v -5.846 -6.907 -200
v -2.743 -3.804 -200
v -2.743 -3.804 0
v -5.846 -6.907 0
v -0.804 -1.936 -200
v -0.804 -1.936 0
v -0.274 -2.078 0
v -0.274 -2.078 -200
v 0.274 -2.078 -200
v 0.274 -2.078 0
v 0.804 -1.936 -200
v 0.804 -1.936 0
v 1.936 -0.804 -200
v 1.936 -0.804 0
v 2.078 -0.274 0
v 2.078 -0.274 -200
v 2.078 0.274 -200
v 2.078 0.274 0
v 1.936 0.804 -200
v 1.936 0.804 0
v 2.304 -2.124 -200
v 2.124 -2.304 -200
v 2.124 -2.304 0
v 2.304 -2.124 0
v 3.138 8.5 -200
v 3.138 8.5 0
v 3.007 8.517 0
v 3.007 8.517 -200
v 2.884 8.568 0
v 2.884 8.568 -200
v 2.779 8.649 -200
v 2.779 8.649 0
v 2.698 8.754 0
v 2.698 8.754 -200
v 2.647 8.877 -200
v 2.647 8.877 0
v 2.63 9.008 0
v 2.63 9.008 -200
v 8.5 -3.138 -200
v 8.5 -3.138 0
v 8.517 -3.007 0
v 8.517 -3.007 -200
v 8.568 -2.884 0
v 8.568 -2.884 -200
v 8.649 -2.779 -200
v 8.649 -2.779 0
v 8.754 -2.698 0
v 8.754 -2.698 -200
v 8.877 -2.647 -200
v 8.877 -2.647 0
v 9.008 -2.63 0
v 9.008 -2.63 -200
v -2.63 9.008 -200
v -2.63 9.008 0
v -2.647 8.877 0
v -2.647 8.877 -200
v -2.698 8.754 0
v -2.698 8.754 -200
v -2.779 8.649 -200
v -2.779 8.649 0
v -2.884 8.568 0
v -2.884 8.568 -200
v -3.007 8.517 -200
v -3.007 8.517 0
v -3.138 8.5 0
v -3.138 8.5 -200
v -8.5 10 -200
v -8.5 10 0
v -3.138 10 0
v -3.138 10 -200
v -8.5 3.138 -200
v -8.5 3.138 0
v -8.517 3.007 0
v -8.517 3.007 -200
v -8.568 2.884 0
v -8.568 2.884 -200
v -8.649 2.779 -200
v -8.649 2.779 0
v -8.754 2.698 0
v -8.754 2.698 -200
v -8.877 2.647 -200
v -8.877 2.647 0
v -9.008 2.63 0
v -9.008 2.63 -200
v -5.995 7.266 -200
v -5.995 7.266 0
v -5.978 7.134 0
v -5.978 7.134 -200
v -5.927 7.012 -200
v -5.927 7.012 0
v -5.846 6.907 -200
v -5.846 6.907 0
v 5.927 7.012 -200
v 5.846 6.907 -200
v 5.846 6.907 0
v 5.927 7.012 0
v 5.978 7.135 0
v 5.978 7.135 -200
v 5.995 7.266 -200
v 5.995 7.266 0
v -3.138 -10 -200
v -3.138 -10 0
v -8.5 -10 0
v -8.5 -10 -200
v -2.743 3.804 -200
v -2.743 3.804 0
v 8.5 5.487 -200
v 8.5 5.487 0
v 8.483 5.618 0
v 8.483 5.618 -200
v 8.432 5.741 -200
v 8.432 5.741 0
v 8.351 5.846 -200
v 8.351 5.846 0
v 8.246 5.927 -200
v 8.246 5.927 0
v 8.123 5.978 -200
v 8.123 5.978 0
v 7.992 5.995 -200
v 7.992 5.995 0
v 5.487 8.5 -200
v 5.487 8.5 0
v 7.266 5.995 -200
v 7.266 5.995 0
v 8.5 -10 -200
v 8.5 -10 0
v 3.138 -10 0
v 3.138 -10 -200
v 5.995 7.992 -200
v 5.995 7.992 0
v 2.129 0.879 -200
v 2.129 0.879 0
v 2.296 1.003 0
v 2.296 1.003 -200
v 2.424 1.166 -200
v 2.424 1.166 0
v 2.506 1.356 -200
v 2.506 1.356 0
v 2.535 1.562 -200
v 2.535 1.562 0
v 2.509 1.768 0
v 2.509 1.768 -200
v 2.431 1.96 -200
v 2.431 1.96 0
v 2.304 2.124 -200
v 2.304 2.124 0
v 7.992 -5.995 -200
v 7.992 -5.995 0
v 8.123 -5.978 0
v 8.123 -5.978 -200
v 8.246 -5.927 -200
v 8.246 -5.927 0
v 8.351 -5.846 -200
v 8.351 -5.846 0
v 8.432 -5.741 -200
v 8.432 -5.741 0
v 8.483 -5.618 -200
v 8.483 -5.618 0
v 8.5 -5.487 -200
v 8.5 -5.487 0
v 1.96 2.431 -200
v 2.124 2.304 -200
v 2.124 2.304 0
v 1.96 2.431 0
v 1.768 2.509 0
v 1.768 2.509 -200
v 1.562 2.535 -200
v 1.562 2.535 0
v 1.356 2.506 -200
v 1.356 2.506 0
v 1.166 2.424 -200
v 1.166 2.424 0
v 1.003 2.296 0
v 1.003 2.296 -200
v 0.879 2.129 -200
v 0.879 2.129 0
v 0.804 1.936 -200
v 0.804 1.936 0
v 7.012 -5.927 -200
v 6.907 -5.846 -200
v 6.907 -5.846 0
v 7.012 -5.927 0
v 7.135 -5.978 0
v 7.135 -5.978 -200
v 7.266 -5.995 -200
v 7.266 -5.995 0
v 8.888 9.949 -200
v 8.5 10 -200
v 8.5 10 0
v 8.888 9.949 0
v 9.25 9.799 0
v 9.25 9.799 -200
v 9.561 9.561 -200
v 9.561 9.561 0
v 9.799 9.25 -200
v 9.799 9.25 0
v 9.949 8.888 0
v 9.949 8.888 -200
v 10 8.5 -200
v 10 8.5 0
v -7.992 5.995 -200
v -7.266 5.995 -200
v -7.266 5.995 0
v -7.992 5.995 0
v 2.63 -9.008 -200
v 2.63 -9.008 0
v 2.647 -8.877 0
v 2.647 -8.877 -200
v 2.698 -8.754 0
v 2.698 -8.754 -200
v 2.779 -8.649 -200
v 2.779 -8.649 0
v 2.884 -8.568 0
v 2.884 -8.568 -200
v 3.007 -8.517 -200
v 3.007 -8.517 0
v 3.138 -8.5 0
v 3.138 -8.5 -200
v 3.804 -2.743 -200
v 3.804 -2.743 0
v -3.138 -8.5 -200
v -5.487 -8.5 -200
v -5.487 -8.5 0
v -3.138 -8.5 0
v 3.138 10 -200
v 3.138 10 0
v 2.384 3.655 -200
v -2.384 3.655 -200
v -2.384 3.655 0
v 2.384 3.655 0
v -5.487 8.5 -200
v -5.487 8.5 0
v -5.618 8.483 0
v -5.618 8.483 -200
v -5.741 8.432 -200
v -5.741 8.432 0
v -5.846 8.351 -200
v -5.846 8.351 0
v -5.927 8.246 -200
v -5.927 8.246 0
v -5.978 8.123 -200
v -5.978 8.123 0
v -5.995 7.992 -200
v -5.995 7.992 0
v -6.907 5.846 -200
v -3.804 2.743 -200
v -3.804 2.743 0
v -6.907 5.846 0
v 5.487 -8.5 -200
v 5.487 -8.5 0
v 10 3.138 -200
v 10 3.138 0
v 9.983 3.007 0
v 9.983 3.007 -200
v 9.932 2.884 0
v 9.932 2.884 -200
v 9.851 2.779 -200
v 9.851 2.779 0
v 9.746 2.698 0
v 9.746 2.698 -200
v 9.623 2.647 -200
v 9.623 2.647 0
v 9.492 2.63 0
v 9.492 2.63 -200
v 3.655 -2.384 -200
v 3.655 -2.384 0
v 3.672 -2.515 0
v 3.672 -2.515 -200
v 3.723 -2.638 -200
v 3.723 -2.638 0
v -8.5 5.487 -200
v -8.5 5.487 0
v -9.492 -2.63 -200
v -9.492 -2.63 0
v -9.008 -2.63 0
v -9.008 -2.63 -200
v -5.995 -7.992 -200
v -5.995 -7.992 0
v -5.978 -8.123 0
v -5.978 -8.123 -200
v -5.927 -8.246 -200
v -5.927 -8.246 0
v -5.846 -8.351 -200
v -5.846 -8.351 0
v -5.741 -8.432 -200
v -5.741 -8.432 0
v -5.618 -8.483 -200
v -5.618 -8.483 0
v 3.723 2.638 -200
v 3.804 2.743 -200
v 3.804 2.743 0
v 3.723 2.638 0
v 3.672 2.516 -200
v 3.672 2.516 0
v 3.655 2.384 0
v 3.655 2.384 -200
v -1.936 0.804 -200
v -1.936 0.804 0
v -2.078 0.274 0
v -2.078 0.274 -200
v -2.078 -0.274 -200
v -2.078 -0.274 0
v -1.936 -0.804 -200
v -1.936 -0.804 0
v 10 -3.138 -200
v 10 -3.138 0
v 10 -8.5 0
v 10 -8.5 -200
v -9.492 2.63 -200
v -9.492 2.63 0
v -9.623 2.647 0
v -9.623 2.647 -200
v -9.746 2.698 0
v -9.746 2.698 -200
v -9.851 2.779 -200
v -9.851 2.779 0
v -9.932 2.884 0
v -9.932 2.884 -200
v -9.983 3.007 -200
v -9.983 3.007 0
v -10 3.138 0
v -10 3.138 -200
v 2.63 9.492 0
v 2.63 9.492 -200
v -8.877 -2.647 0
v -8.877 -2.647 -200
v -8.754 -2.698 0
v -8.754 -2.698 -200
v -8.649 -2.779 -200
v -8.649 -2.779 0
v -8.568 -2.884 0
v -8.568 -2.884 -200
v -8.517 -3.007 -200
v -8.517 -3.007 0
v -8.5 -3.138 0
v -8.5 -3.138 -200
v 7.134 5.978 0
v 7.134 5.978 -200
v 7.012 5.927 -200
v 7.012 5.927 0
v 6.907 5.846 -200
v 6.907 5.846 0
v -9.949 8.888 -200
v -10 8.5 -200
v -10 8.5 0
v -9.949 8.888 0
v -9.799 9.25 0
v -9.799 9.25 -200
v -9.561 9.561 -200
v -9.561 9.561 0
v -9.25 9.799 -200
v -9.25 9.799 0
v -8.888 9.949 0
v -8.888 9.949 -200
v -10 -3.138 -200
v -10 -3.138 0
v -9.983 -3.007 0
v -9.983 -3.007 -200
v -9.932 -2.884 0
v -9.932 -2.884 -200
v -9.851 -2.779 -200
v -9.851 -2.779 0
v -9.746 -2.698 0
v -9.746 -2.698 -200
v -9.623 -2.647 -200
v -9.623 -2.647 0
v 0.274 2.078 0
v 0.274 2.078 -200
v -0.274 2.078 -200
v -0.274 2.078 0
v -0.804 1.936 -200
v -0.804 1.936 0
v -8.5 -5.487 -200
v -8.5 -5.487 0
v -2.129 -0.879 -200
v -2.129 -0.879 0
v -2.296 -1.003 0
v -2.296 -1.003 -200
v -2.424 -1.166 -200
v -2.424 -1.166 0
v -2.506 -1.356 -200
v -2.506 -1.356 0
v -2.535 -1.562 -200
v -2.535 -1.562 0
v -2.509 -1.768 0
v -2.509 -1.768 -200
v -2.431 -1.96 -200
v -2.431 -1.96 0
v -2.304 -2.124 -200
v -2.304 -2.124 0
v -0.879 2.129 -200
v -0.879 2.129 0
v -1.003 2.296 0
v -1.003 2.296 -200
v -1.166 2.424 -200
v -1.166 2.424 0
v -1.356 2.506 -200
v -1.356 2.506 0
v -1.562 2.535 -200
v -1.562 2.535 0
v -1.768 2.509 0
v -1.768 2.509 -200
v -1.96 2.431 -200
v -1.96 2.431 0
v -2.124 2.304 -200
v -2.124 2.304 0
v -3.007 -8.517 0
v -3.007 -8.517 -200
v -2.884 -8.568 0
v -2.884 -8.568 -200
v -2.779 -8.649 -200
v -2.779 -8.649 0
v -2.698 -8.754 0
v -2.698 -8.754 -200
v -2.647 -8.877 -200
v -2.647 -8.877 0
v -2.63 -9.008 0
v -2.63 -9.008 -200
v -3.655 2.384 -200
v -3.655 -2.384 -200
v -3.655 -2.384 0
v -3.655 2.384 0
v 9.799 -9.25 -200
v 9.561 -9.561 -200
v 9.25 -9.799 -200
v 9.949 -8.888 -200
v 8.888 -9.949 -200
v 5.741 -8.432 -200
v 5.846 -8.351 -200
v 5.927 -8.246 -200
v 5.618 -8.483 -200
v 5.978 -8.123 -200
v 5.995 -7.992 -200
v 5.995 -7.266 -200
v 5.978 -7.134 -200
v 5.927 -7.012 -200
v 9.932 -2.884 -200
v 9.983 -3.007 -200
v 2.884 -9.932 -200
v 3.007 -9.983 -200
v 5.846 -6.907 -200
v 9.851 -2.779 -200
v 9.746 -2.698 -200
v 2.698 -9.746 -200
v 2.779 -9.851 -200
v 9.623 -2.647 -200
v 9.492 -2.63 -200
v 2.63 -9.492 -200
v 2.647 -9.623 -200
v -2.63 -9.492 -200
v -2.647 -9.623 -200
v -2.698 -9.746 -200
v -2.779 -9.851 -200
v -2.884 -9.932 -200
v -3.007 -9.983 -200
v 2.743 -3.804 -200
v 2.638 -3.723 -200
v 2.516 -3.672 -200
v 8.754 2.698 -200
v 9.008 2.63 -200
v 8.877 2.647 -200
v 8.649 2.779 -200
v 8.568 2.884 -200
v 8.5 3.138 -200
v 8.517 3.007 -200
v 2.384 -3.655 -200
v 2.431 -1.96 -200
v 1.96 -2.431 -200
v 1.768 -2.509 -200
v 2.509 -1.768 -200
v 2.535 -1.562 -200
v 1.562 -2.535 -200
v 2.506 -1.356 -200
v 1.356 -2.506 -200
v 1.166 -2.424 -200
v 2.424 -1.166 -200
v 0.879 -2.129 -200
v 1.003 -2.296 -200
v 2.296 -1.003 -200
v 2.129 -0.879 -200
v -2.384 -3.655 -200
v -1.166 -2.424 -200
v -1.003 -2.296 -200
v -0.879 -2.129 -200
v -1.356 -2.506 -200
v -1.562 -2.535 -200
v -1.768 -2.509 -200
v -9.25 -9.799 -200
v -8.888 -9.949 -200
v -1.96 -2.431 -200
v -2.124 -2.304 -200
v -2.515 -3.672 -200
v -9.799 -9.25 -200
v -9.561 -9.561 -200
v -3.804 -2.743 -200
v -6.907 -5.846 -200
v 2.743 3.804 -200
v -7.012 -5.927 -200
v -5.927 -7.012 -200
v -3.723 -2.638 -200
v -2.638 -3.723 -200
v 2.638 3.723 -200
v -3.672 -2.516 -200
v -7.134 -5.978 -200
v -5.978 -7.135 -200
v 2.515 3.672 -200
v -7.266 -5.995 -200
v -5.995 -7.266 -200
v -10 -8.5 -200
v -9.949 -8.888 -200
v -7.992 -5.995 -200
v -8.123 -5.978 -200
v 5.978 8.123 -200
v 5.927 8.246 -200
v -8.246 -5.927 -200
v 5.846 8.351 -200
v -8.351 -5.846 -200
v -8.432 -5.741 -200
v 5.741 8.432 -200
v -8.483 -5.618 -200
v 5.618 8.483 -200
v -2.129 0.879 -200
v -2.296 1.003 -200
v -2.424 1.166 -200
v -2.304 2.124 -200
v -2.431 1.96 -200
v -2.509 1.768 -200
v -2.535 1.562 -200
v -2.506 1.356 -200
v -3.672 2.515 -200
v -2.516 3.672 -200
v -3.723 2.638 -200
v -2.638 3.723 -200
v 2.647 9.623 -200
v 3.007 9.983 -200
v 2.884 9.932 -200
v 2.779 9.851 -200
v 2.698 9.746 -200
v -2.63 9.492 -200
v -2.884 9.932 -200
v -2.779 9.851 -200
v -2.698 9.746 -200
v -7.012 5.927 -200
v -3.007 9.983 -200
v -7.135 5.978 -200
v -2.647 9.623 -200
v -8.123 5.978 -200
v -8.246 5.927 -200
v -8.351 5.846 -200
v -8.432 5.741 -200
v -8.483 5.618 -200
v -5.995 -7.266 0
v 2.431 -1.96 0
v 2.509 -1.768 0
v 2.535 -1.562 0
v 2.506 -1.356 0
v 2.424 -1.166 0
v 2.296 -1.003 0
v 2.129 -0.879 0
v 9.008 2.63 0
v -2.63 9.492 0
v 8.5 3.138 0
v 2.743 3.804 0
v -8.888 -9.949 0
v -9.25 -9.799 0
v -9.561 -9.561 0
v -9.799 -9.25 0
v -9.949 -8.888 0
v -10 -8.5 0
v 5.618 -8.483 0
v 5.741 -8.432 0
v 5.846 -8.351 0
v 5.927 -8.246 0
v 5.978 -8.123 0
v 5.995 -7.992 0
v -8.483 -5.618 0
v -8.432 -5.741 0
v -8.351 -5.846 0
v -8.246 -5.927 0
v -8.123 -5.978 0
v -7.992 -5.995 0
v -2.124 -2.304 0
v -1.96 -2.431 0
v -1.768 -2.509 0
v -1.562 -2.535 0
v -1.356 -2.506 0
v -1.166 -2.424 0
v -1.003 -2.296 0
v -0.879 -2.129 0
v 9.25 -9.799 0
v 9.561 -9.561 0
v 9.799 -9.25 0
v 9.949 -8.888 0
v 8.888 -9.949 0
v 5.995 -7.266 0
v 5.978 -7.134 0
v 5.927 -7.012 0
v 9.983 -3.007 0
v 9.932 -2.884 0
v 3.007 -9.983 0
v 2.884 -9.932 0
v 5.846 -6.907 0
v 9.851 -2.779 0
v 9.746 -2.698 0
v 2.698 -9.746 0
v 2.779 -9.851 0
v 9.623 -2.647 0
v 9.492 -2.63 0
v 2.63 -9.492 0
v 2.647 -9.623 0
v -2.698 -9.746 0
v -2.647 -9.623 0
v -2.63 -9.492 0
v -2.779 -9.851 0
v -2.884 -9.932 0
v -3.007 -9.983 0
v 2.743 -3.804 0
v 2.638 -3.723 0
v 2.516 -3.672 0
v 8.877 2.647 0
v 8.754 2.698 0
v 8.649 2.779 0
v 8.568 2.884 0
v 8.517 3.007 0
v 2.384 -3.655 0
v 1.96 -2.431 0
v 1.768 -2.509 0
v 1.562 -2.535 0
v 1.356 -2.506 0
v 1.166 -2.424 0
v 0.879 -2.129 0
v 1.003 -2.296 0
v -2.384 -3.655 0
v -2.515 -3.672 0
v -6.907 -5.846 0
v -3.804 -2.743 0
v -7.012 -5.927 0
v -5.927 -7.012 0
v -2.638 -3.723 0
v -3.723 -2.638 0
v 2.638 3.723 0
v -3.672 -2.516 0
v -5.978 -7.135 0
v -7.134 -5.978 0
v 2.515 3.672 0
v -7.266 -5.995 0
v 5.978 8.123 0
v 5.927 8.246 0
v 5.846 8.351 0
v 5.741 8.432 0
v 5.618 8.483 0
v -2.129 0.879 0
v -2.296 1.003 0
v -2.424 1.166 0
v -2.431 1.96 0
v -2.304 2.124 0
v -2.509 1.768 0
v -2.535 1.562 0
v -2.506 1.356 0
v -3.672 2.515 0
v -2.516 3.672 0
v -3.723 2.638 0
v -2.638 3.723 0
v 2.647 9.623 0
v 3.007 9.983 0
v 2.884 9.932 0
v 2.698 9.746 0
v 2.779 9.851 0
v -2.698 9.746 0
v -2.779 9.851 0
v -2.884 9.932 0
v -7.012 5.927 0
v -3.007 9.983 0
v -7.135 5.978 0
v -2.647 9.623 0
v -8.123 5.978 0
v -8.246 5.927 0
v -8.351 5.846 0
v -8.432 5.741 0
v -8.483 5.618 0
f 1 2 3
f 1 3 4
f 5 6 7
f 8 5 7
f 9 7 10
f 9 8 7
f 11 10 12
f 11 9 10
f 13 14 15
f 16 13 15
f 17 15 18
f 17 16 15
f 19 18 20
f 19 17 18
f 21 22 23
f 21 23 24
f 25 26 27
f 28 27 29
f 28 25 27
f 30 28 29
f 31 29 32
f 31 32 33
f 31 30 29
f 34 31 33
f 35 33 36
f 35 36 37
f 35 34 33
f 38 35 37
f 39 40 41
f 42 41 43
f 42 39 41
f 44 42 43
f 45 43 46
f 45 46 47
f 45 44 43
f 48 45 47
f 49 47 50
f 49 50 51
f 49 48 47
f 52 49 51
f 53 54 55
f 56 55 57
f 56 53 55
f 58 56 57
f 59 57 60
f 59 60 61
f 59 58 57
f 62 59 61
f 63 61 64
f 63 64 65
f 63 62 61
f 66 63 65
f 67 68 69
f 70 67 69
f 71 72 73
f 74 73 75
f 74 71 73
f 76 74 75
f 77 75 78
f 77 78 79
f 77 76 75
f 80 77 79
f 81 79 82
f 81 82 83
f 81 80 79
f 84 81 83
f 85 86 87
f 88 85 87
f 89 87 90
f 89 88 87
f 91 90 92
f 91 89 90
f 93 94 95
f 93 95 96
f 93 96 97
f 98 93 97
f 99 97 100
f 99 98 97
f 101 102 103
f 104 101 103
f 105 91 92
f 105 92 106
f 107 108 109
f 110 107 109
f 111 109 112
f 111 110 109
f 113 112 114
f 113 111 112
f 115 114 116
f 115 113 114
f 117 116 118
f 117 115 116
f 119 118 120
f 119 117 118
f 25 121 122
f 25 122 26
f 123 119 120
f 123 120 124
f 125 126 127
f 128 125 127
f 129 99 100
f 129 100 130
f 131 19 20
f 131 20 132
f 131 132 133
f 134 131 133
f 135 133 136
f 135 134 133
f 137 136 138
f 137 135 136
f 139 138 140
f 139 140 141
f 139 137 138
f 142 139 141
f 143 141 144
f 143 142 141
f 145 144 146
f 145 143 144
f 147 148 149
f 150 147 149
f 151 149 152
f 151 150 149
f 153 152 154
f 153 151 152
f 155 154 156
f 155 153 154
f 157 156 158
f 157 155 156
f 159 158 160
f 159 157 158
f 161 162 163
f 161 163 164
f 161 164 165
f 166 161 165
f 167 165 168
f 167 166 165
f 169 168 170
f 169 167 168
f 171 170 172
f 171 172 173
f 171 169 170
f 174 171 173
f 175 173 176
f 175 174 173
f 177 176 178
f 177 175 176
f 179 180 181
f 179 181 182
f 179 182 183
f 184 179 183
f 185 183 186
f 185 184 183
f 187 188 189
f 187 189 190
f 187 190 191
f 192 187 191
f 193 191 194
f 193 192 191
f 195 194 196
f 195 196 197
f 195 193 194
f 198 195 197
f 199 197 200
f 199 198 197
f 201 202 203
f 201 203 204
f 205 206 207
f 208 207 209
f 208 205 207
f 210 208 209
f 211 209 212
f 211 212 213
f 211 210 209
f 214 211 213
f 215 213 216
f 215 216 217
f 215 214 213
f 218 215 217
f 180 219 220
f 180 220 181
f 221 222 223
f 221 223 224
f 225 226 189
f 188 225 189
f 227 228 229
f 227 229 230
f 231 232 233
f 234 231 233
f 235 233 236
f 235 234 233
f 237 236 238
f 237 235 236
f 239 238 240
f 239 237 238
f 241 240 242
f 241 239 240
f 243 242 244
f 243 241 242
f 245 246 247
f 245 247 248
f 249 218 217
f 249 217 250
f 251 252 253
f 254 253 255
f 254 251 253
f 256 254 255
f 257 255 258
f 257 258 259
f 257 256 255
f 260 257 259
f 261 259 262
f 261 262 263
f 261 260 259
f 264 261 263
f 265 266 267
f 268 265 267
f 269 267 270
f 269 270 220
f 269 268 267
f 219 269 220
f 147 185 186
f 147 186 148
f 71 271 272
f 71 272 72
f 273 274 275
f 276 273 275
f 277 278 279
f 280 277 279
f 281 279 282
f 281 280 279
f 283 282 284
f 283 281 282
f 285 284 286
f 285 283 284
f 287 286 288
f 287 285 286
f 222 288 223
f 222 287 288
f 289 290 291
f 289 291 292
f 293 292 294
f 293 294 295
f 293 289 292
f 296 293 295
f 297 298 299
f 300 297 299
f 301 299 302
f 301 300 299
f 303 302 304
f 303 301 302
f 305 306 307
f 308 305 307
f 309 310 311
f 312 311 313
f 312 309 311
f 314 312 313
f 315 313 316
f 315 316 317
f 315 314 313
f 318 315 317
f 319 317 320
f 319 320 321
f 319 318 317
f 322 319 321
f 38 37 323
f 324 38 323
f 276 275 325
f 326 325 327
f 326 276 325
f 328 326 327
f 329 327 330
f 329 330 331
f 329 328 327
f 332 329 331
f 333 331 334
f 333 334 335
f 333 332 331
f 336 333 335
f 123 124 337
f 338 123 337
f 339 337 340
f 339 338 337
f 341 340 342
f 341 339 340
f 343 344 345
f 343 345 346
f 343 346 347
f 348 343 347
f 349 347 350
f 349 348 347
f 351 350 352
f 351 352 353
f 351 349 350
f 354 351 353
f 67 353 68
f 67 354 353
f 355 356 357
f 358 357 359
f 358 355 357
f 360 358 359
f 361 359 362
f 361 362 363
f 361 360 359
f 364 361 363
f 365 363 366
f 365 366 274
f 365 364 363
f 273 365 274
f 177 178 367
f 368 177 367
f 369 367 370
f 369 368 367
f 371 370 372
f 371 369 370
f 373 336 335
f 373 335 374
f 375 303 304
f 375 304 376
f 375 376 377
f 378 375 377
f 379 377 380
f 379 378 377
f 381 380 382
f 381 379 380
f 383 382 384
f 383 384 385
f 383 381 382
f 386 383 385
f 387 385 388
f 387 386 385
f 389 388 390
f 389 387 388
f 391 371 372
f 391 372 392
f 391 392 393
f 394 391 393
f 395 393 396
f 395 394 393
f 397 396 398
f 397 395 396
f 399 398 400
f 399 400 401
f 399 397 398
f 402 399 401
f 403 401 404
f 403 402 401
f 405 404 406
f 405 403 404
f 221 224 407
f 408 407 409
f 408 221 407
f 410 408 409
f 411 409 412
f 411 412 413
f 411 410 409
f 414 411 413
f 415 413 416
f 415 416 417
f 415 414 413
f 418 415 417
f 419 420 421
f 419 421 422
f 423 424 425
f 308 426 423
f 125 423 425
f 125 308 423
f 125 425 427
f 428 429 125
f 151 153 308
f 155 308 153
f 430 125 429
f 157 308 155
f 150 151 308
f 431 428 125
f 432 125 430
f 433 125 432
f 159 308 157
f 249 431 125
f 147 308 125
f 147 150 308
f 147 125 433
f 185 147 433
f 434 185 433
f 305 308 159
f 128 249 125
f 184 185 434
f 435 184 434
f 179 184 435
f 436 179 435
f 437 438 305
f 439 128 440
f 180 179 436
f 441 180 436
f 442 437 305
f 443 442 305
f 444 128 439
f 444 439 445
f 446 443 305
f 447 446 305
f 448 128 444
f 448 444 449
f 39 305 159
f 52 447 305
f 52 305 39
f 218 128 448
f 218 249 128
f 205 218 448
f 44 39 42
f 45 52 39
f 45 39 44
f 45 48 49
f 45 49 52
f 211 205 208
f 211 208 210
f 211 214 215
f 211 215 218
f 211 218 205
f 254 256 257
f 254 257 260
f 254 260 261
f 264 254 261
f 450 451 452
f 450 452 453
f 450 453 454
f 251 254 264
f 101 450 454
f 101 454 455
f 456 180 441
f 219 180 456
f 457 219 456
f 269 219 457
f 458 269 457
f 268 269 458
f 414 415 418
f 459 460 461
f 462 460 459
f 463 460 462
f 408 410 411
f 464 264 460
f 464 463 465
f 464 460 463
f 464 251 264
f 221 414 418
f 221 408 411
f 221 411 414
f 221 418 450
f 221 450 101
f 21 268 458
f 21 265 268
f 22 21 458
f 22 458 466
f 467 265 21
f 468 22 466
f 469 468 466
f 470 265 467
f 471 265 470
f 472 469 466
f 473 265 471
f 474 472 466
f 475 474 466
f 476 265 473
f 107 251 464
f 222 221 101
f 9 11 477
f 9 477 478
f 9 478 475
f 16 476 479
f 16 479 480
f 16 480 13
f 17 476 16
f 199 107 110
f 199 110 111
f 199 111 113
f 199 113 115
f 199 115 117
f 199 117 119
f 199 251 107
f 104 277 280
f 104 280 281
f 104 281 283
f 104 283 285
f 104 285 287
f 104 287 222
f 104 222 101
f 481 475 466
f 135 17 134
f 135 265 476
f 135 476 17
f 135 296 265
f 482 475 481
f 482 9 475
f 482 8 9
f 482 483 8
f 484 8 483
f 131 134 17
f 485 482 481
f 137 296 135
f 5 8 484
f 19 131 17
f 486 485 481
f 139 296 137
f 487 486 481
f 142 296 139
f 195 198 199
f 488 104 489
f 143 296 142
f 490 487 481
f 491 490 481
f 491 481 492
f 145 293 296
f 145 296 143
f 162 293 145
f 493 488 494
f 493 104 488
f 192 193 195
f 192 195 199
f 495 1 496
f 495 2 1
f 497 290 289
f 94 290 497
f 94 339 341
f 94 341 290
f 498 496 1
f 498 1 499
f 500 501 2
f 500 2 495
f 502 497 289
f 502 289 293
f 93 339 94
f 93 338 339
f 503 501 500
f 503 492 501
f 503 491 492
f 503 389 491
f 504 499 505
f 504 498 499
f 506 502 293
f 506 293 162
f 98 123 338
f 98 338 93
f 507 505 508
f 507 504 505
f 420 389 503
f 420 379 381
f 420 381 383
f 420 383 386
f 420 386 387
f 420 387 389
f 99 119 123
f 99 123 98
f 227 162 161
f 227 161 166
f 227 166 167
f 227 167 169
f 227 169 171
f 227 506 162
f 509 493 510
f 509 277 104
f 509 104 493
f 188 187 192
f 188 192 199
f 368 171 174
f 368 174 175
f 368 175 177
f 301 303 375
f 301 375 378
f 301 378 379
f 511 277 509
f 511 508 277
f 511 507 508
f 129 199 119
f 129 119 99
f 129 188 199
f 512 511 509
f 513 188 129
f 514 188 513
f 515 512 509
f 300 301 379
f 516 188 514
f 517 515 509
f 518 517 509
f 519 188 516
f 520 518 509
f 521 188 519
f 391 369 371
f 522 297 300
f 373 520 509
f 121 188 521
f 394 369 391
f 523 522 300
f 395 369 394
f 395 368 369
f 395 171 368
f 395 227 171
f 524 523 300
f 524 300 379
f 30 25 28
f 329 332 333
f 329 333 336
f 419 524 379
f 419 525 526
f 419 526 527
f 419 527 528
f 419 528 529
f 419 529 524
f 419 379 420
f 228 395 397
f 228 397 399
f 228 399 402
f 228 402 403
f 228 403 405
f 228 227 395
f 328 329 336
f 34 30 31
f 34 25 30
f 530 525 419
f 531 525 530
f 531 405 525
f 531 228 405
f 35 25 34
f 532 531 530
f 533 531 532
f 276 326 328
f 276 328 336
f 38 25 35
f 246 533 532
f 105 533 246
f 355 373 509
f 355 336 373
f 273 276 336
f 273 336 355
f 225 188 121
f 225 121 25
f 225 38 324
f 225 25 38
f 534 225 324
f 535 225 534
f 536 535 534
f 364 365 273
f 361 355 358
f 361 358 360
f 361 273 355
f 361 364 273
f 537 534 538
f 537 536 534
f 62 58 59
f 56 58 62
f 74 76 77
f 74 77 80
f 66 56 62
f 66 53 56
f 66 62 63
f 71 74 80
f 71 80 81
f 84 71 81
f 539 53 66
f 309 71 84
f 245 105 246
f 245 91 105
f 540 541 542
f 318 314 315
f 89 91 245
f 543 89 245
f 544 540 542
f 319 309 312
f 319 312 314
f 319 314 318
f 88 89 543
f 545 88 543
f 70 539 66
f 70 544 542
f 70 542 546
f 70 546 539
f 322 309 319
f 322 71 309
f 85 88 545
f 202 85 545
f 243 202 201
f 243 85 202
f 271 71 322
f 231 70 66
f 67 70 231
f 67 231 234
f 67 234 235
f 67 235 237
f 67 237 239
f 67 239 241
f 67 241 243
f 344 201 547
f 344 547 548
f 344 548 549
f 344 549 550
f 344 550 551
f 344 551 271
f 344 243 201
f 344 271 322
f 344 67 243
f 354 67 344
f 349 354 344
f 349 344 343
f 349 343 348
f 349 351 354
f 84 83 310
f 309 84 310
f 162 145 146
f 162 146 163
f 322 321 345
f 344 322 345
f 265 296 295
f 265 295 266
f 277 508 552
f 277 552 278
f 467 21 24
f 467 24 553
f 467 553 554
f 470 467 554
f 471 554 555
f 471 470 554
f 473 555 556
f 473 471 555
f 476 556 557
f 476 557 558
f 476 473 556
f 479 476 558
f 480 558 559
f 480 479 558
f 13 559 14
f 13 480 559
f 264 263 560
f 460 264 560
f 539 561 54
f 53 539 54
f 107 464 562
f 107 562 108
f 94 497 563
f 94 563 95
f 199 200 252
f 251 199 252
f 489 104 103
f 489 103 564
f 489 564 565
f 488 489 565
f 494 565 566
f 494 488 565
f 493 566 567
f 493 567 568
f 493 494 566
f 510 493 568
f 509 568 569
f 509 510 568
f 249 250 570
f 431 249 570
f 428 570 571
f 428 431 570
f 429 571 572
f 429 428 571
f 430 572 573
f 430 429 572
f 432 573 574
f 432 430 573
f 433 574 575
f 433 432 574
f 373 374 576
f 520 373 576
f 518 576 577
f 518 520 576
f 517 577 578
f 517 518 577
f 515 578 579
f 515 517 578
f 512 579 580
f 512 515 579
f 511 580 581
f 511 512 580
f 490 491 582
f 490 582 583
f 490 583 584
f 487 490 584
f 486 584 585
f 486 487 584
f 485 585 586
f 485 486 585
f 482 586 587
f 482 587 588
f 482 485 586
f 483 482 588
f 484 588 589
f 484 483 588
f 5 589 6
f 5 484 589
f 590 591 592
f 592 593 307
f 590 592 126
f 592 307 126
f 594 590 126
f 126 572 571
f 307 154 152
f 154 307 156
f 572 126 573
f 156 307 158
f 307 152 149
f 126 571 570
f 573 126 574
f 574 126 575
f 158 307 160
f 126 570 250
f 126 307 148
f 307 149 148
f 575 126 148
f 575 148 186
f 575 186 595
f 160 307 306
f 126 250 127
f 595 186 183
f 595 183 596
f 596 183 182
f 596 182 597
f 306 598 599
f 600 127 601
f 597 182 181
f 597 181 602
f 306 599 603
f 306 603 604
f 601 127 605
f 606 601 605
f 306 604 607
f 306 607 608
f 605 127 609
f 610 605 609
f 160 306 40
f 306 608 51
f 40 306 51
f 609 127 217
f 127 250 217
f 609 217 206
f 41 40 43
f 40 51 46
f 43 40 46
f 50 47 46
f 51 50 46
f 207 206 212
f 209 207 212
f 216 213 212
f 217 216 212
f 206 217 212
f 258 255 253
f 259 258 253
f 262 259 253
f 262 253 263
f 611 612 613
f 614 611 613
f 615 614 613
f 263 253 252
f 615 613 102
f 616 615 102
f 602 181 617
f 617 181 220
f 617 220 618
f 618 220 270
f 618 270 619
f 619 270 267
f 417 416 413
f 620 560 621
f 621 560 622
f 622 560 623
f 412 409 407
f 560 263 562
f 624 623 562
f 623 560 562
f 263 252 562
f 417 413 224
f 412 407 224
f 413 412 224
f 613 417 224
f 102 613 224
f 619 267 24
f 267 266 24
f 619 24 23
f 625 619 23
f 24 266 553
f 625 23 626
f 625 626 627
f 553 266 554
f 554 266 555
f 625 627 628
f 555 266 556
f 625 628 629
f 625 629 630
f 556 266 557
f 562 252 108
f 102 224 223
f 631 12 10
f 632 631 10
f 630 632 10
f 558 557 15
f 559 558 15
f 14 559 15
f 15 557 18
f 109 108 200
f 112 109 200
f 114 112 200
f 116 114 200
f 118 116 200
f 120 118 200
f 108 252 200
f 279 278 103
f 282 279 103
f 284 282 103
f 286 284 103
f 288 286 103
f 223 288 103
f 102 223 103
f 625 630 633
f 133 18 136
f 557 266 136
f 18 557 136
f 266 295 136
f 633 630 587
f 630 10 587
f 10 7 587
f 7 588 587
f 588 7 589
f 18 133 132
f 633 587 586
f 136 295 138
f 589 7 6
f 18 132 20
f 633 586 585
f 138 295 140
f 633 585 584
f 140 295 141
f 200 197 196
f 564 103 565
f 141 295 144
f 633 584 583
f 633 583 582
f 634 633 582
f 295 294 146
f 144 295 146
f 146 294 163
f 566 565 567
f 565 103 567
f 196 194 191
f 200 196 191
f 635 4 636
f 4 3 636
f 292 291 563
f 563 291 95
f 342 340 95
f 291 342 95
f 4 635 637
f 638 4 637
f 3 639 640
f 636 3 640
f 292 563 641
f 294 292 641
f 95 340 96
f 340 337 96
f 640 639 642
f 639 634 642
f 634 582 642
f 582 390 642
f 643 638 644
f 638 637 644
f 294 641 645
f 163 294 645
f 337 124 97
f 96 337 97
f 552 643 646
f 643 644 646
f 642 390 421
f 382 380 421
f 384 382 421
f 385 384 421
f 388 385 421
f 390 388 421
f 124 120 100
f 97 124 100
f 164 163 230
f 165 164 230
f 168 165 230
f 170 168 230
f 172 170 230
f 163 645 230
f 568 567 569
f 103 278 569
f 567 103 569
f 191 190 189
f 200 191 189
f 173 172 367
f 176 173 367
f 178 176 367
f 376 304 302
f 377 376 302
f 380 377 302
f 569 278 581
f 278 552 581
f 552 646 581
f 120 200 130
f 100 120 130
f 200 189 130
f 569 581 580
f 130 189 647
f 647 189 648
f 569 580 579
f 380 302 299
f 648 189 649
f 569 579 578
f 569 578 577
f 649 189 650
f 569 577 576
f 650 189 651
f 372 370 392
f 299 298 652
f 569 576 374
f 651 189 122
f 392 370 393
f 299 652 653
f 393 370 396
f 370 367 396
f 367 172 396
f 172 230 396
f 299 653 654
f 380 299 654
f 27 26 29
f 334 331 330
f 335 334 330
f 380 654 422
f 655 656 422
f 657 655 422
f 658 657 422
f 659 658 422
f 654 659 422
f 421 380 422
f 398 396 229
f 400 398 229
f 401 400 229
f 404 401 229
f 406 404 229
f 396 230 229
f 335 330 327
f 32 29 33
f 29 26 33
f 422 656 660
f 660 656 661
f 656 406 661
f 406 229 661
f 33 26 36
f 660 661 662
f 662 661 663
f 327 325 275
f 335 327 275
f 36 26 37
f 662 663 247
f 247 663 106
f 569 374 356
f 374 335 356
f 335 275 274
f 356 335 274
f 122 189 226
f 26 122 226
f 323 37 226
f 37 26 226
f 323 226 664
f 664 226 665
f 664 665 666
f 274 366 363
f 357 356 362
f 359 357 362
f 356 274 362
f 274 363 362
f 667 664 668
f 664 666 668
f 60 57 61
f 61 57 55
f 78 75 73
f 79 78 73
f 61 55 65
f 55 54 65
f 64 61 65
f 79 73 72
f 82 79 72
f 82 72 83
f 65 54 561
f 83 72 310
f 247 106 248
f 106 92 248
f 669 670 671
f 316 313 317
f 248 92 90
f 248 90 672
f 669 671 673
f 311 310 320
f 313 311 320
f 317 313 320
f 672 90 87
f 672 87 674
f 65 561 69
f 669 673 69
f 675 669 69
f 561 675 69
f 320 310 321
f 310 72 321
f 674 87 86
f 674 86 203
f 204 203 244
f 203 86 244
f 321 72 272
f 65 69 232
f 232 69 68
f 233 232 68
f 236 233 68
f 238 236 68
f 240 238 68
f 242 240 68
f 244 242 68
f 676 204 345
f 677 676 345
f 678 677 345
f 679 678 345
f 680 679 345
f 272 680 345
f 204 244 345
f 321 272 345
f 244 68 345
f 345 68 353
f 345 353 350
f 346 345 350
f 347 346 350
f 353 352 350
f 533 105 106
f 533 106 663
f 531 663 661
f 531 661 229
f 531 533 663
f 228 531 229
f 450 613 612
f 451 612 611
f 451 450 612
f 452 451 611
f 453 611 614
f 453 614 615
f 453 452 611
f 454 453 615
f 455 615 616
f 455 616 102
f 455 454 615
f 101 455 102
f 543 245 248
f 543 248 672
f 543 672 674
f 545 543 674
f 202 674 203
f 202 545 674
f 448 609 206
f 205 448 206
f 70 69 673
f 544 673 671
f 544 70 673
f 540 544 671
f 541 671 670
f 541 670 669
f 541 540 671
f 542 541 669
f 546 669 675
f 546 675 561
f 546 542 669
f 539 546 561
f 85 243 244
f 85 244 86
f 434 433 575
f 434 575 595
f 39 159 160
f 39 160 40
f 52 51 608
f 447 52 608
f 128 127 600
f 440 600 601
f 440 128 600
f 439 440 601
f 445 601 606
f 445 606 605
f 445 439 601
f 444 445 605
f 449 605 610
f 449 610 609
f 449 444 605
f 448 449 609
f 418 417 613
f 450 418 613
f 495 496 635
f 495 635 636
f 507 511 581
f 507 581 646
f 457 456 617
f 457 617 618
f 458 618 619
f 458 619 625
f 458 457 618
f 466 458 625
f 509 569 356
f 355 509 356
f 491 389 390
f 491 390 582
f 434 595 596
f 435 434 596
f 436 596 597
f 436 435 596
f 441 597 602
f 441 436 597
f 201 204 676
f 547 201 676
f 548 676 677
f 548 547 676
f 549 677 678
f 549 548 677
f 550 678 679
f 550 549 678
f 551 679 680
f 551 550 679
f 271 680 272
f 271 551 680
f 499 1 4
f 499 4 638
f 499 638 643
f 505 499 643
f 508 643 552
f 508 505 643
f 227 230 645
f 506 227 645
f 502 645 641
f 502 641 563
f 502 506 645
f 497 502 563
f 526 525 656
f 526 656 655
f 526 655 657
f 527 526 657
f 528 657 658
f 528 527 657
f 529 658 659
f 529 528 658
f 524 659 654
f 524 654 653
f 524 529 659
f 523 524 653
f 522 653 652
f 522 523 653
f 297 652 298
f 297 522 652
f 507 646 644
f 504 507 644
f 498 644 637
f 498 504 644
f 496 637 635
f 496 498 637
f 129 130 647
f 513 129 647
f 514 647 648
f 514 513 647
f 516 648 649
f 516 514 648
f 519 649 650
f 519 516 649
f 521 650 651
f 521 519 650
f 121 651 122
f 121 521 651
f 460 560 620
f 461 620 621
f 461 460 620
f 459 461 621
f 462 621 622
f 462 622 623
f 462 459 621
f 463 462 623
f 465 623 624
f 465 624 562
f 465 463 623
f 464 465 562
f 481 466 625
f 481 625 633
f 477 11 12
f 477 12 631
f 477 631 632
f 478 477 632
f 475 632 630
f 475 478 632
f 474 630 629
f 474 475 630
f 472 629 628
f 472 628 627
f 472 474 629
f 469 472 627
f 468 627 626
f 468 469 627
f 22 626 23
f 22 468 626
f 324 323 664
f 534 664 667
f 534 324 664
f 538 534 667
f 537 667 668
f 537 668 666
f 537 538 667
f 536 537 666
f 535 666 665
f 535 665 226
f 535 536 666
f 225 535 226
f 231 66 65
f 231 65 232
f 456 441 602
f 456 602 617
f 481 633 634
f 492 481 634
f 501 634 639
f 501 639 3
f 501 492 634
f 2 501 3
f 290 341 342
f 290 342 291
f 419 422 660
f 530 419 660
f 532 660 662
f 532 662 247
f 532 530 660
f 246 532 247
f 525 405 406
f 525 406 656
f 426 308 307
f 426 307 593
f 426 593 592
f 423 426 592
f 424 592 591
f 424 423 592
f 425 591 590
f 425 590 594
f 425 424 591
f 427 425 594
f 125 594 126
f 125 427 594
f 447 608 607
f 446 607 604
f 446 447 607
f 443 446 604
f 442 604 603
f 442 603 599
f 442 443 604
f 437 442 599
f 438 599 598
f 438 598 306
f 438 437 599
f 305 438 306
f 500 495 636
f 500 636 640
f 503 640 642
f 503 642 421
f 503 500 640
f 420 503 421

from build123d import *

# Parameters (mm, degrees)
BOSS_EXTRUDE1_DEPTH = 200


with BuildPart() as part:
    # Sketch1 → Boss-Extrude1 (new body)
    with BuildSketch(Plane(origin=(0, 0, -200), x_dir=(-1, 0, 0), z_dir=(0, 0, -1))):
        with BuildLine():
            Line((10, -8.5), (10, -3.138))
            ThreePointArc((10, -3.138), (9.851210245, -2.778789755), (9.492, -2.63))
            Line((9.492, -2.63), (9.008, -2.63))
            ThreePointArc((9.008, -2.63), (8.648789755, -2.778789755), (8.5, -3.138))
            Line((8.5, -3.138), (8.5, -5.487))
            ThreePointArc((8.5, -5.487), (8.351210245, -5.846210245), (7.992, -5.995))
            Line((7.992, -5.995), (7.26592049, -5.995))
            ThreePointArc((7.26592049, -5.995), (7.071517306, -5.956330803), (6.906710245, -5.846210245))
            Line((6.906710245, -5.846210245), (3.803789755, -2.743289755))
            ThreePointArc((3.803789755, -2.743289755), (3.693669197, -2.578482694), (3.655, -2.38407951))
            Line((3.655, -2.38407951), (3.655, 2.383759167))
            ThreePointArc((3.655, 2.383759167), (3.693669197, 2.57816235), (3.803789755, 2.742969412))
            Line((3.803789755, 2.742969412), (6.907030588, 5.846210245))
            ThreePointArc((6.907030588, 5.846210245), (7.07183765, 5.956330803), (7.266240833, 5.995))
            Line((7.266240833, 5.995), (7.992, 5.995))
            ThreePointArc((7.992, 5.995), (8.351210245, 5.846210245), (8.5, 5.487))
            Line((8.5, 5.487), (8.5, 3.138))
            ThreePointArc((8.5, 3.138), (8.648789755, 2.778789755), (9.008, 2.63))
            Line((9.008, 2.63), (9.492, 2.63))
            ThreePointArc((9.492, 2.63), (9.851210245, 2.778789755), (10, 3.138))
            Line((10, 3.138), (10, 8.5))
            ThreePointArc((10, 8.5), (9.560660172, 9.560660172), (8.5, 10))
            Line((8.5, 10), (3.138, 10))
            ThreePointArc((3.138, 10), (2.778789755, 9.851210245), (2.63, 9.492))
            Line((2.63, 9.492), (2.63, 9.008))
            ThreePointArc((2.63, 9.008), (2.778789755, 8.648789755), (3.138, 8.5))
            Line((3.138, 8.5), (5.487, 8.5))
            ThreePointArc((5.487, 8.5), (5.846210245, 8.351210245), (5.995, 7.992))
            Line((5.995, 7.992), (5.995, 7.26592049))
            ThreePointArc((5.995, 7.26592049), (5.956330803, 7.071517306), (5.846210245, 6.906710245))
            Line((5.846210245, 6.906710245), (2.743289755, 3.803789755))
            ThreePointArc((2.743289755, 3.803789755), (2.578482694, 3.693669197), (2.38407951, 3.655))
            Line((2.38407951, 3.655), (-2.383759167, 3.655))
            ThreePointArc((-2.383759167, 3.655), (-2.57816235, 3.693669197), (-2.742969412, 3.803789755))
            Line((-2.742969412, 3.803789755), (-5.846210245, 6.907030588))
            ThreePointArc((-5.846210245, 6.907030588), (-5.956330803, 7.07183765), (-5.995, 7.266240833))
            Line((-5.995, 7.266240833), (-5.995, 7.992))
            ThreePointArc((-5.995, 7.992), (-5.846210245, 8.351210245), (-5.487, 8.5))
            Line((-5.487, 8.5), (-3.138, 8.5))
            ThreePointArc((-3.138, 8.5), (-2.778789755, 8.648789755), (-2.63, 9.008))
            Line((-2.63, 9.008), (-2.63, 9.492))
            ThreePointArc((-2.63, 9.492), (-2.778789755, 9.851210245), (-3.138, 10))
            Line((-3.138, 10), (-8.5, 10))
            ThreePointArc((-8.5, 10), (-9.560660172, 9.560660172), (-10, 8.5))
            Line((-10, 8.5), (-10, 3.138))
            ThreePointArc((-10, 3.138), (-9.851210245, 2.778789755), (-9.492, 2.63))
            Line((-9.492, 2.63), (-9.008, 2.63))
            ThreePointArc((-9.008, 2.63), (-8.648789755, 2.778789755), (-8.5, 3.138))
            Line((-8.5, 3.138), (-8.5, 5.487))
            ThreePointArc((-8.5, 5.487), (-8.351210245, 5.846210245), (-7.992, 5.995))
            Line((-7.992, 5.995), (-7.26592049, 5.995))
            ThreePointArc((-7.26592049, 5.995), (-7.071517306, 5.956330803), (-6.906710245, 5.846210245))
            Line((-6.906710245, 5.846210245), (-3.803789755, 2.743289755))
            ThreePointArc((-3.803789755, 2.743289755), (-3.693669197, 2.578482694), (-3.655, 2.38407951))
            Line((-3.655, 2.38407951), (-3.655, -2.383759167))
            ThreePointArc((-3.655, -2.383759167), (-3.693669197, -2.57816235), (-3.803789755, -2.742969412))
            Line((-3.803789755, -2.742969412), (-6.907030588, -5.846210245))
            ThreePointArc((-6.907030588, -5.846210245), (-7.07183765, -5.956330803), (-7.266240833, -5.995))
            Line((-7.266240833, -5.995), (-7.992, -5.995))
            ThreePointArc((-7.992, -5.995), (-8.351210245, -5.846210245), (-8.5, -5.487))
            Line((-8.5, -5.487), (-8.5, -3.138))
            ThreePointArc((-8.5, -3.138), (-8.648789755, -2.778789755), (-9.008, -2.63))
            Line((-9.008, -2.63), (-9.492, -2.63))
            ThreePointArc((-9.492, -2.63), (-9.851210245, -2.778789755), (-10, -3.138))
            Line((-10, -3.138), (-10, -8.5))
            ThreePointArc((-10, -8.5), (-9.560660172, -9.560660172), (-8.5, -10))
            Line((-8.5, -10), (-3.138, -10))
            ThreePointArc((-3.138, -10), (-2.778789755, -9.851210245), (-2.63, -9.492))
            Line((-2.63, -9.492), (-2.63, -9.008))
            ThreePointArc((-2.63, -9.008), (-2.778789755, -8.648789755), (-3.138, -8.5))
            Line((-3.138, -8.5), (-5.487, -8.5))
            ThreePointArc((-5.487, -8.5), (-5.846210245, -8.351210245), (-5.995, -7.992))
            Line((-5.995, -7.992), (-5.995, -7.26592049))
            ThreePointArc((-5.995, -7.26592049), (-5.956330803, -7.071517306), (-5.846210245, -6.906710245))
            Line((-5.846210245, -6.906710245), (-2.743289755, -3.803789755))
            ThreePointArc((-2.743289755, -3.803789755), (-2.578482694, -3.693669197), (-2.38407951, -3.655))
            Line((-2.38407951, -3.655), (2.383759167, -3.655))
            ThreePointArc((2.383759167, -3.655), (2.57816235, -3.693669197), (2.742969412, -3.803789755))
            Line((2.742969412, -3.803789755), (5.846210245, -6.907030588))
            ThreePointArc((5.846210245, -6.907030588), (5.956330803, -7.07183765), (5.995, -7.266240833))
            Line((5.995, -7.266240833), (5.995, -7.992))
            ThreePointArc((5.995, -7.992), (5.846210245, -8.351210245), (5.487, -8.5))
            Line((5.487, -8.5), (3.138, -8.5))
            ThreePointArc((3.138, -8.5), (2.778789755, -8.648789755), (2.63, -9.008))
            Line((2.63, -9.008), (2.63, -9.492))
            ThreePointArc((2.63, -9.492), (2.778789755, -9.851210245), (3.138, -10))
            Line((3.138, -10), (8.5, -10))
            ThreePointArc((8.5, -10), (9.560660172, -9.560660172), (10, -8.5))
        make_face()
        with BuildLine():
            Line((2.304493037, -2.124493037), (2.124493037, -2.304493037))
            ThreePointArc((2.124493037, -2.304493037), (1.35638567, -2.506016078), (0.803729988, -1.935777391))
            ThreePointArc((0.803729988, -1.935777391), (0, -2.096), (-0.803729988, -1.935777391))
            ThreePointArc((-0.803729988, -1.935777391), (-1.35638567, -2.506016078), (-2.124493037, -2.304493037))
            Line((-2.124493037, -2.304493037), (-2.304493037, -2.124493037))
            ThreePointArc((-2.304493037, -2.124493037), (-2.506016078, -1.35638567), (-1.935777391, -0.803729988))
            ThreePointArc((-1.935777391, -0.803729988), (-2.096, 0), (-1.935777391, 0.803729988))
            ThreePointArc((-1.935777391, 0.803729988), (-2.506016078, 1.35638567), (-2.304493037, 2.124493037))
            Line((-2.304493037, 2.124493037), (-2.124493037, 2.304493037))
            ThreePointArc((-2.124493037, 2.304493037), (-1.35638567, 2.506016078), (-0.803729988, 1.935777391))
            ThreePointArc((-0.803729988, 1.935777391), (0, 2.096), (0.803729988, 1.935777391))
            ThreePointArc((0.803729988, 1.935777391), (1.35638567, 2.506016078), (2.124493037, 2.304493037))
            Line((2.124493037, 2.304493037), (2.304493037, 2.124493037))
            ThreePointArc((2.304493037, 2.124493037), (2.506016078, 1.35638567), (1.935777391, 0.803729988))
            ThreePointArc((1.935777391, 0.803729988), (2.096, 0), (1.935777391, -0.803729988))
            ThreePointArc((1.935777391, -0.803729988), (2.506016078, -1.35638567), (2.304493037, -2.124493037))
        make_face(mode=Mode.SUBTRACT)
    extrude(amount=-BOSS_EXTRUDE1_DEPTH)


solid = part.part
